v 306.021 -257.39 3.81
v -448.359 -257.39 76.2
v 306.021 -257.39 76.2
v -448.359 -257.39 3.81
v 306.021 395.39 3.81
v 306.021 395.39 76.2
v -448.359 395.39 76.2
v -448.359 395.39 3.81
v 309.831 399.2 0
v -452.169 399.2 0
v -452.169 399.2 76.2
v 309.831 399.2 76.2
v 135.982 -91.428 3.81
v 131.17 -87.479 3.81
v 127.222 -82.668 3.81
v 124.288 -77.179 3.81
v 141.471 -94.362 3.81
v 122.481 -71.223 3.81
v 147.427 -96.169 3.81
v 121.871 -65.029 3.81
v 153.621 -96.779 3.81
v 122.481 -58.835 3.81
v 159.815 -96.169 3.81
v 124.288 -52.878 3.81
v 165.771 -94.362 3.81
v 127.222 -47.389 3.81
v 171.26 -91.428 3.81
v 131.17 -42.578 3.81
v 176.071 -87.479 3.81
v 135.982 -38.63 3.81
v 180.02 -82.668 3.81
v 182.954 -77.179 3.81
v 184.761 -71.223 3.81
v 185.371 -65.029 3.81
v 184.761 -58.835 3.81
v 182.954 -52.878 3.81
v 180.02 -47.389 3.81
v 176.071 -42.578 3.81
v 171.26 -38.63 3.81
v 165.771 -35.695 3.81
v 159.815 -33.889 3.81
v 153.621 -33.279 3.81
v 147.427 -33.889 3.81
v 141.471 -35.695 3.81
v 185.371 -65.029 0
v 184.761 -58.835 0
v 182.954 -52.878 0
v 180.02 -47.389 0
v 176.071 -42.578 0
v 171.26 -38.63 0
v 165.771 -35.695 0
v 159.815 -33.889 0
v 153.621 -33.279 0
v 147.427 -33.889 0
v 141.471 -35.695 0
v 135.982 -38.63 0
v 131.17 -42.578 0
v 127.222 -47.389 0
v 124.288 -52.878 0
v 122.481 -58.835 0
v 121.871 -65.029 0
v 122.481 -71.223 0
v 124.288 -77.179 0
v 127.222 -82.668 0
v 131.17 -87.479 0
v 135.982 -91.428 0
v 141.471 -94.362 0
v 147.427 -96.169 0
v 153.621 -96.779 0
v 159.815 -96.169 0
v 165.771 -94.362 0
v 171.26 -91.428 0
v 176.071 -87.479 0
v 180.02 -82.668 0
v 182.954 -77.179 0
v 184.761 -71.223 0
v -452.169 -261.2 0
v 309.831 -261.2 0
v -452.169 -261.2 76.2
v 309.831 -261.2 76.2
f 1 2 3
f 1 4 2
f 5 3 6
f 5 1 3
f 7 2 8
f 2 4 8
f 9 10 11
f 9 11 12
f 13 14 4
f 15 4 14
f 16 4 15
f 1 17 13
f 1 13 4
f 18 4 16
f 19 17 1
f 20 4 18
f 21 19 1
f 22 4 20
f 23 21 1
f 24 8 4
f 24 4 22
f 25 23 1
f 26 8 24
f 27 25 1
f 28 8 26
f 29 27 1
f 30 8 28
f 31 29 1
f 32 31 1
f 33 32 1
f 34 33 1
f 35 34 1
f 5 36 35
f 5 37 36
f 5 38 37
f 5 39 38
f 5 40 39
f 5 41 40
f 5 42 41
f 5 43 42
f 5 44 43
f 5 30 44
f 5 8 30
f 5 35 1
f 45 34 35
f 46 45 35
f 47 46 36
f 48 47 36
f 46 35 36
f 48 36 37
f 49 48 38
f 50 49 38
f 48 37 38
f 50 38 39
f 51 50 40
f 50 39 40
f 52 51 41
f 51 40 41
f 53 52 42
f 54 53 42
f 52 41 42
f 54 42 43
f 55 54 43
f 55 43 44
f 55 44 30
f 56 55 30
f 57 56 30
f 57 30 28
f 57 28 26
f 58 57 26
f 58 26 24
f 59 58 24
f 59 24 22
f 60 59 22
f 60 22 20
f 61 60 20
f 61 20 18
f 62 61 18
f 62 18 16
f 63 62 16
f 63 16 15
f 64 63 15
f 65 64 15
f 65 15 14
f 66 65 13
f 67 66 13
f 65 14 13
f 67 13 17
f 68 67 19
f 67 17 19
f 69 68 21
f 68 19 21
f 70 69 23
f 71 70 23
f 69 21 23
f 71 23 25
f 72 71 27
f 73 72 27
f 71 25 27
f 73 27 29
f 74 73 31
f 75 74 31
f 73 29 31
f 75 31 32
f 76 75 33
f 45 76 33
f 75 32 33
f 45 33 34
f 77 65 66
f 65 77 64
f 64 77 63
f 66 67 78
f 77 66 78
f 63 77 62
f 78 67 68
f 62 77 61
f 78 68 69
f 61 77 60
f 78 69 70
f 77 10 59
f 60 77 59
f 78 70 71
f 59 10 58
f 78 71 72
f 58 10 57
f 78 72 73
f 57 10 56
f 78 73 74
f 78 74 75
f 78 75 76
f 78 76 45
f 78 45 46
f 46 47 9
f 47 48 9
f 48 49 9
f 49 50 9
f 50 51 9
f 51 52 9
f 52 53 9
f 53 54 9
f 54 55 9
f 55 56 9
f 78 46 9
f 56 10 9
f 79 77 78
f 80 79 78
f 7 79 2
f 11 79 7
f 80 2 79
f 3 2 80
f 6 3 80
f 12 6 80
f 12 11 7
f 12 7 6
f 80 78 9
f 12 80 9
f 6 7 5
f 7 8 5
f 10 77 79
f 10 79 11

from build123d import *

# Parameters (mm, degrees)
F0_W     = 762
F0_H     = 660.4
F1_DEPTH = 76.2
F2_T     = -3.81
F3_R     = 31.75
F4_DEPTH = 3.811


with BuildPart() as f1:
    # F0 (on Top) → F1 (new body)
    with BuildSketch(Plane.XY):
        with Locations((-71.169143, 69.000456)):
            Rectangle(F0_W, F0_H)
    extrude(amount=F1_DEPTH)

    # F2
    f2_openings = [f1.faces().sort_by_distance(p)[0] for p in [
        (-71.169143, 69.000456, 76.2),
    ]]
    offset(amount=F2_T, openings=f2_openings)

    # F3 (on face) → F4 (cut, through all)
    with BuildSketch(Plane.XY.offset(3.81)):
        with Locations((153.620857, -65.028675)):
            Circle(F3_R)
    extrude(amount=-F4_DEPTH, mode=Mode.SUBTRACT)


solid = f1.part
